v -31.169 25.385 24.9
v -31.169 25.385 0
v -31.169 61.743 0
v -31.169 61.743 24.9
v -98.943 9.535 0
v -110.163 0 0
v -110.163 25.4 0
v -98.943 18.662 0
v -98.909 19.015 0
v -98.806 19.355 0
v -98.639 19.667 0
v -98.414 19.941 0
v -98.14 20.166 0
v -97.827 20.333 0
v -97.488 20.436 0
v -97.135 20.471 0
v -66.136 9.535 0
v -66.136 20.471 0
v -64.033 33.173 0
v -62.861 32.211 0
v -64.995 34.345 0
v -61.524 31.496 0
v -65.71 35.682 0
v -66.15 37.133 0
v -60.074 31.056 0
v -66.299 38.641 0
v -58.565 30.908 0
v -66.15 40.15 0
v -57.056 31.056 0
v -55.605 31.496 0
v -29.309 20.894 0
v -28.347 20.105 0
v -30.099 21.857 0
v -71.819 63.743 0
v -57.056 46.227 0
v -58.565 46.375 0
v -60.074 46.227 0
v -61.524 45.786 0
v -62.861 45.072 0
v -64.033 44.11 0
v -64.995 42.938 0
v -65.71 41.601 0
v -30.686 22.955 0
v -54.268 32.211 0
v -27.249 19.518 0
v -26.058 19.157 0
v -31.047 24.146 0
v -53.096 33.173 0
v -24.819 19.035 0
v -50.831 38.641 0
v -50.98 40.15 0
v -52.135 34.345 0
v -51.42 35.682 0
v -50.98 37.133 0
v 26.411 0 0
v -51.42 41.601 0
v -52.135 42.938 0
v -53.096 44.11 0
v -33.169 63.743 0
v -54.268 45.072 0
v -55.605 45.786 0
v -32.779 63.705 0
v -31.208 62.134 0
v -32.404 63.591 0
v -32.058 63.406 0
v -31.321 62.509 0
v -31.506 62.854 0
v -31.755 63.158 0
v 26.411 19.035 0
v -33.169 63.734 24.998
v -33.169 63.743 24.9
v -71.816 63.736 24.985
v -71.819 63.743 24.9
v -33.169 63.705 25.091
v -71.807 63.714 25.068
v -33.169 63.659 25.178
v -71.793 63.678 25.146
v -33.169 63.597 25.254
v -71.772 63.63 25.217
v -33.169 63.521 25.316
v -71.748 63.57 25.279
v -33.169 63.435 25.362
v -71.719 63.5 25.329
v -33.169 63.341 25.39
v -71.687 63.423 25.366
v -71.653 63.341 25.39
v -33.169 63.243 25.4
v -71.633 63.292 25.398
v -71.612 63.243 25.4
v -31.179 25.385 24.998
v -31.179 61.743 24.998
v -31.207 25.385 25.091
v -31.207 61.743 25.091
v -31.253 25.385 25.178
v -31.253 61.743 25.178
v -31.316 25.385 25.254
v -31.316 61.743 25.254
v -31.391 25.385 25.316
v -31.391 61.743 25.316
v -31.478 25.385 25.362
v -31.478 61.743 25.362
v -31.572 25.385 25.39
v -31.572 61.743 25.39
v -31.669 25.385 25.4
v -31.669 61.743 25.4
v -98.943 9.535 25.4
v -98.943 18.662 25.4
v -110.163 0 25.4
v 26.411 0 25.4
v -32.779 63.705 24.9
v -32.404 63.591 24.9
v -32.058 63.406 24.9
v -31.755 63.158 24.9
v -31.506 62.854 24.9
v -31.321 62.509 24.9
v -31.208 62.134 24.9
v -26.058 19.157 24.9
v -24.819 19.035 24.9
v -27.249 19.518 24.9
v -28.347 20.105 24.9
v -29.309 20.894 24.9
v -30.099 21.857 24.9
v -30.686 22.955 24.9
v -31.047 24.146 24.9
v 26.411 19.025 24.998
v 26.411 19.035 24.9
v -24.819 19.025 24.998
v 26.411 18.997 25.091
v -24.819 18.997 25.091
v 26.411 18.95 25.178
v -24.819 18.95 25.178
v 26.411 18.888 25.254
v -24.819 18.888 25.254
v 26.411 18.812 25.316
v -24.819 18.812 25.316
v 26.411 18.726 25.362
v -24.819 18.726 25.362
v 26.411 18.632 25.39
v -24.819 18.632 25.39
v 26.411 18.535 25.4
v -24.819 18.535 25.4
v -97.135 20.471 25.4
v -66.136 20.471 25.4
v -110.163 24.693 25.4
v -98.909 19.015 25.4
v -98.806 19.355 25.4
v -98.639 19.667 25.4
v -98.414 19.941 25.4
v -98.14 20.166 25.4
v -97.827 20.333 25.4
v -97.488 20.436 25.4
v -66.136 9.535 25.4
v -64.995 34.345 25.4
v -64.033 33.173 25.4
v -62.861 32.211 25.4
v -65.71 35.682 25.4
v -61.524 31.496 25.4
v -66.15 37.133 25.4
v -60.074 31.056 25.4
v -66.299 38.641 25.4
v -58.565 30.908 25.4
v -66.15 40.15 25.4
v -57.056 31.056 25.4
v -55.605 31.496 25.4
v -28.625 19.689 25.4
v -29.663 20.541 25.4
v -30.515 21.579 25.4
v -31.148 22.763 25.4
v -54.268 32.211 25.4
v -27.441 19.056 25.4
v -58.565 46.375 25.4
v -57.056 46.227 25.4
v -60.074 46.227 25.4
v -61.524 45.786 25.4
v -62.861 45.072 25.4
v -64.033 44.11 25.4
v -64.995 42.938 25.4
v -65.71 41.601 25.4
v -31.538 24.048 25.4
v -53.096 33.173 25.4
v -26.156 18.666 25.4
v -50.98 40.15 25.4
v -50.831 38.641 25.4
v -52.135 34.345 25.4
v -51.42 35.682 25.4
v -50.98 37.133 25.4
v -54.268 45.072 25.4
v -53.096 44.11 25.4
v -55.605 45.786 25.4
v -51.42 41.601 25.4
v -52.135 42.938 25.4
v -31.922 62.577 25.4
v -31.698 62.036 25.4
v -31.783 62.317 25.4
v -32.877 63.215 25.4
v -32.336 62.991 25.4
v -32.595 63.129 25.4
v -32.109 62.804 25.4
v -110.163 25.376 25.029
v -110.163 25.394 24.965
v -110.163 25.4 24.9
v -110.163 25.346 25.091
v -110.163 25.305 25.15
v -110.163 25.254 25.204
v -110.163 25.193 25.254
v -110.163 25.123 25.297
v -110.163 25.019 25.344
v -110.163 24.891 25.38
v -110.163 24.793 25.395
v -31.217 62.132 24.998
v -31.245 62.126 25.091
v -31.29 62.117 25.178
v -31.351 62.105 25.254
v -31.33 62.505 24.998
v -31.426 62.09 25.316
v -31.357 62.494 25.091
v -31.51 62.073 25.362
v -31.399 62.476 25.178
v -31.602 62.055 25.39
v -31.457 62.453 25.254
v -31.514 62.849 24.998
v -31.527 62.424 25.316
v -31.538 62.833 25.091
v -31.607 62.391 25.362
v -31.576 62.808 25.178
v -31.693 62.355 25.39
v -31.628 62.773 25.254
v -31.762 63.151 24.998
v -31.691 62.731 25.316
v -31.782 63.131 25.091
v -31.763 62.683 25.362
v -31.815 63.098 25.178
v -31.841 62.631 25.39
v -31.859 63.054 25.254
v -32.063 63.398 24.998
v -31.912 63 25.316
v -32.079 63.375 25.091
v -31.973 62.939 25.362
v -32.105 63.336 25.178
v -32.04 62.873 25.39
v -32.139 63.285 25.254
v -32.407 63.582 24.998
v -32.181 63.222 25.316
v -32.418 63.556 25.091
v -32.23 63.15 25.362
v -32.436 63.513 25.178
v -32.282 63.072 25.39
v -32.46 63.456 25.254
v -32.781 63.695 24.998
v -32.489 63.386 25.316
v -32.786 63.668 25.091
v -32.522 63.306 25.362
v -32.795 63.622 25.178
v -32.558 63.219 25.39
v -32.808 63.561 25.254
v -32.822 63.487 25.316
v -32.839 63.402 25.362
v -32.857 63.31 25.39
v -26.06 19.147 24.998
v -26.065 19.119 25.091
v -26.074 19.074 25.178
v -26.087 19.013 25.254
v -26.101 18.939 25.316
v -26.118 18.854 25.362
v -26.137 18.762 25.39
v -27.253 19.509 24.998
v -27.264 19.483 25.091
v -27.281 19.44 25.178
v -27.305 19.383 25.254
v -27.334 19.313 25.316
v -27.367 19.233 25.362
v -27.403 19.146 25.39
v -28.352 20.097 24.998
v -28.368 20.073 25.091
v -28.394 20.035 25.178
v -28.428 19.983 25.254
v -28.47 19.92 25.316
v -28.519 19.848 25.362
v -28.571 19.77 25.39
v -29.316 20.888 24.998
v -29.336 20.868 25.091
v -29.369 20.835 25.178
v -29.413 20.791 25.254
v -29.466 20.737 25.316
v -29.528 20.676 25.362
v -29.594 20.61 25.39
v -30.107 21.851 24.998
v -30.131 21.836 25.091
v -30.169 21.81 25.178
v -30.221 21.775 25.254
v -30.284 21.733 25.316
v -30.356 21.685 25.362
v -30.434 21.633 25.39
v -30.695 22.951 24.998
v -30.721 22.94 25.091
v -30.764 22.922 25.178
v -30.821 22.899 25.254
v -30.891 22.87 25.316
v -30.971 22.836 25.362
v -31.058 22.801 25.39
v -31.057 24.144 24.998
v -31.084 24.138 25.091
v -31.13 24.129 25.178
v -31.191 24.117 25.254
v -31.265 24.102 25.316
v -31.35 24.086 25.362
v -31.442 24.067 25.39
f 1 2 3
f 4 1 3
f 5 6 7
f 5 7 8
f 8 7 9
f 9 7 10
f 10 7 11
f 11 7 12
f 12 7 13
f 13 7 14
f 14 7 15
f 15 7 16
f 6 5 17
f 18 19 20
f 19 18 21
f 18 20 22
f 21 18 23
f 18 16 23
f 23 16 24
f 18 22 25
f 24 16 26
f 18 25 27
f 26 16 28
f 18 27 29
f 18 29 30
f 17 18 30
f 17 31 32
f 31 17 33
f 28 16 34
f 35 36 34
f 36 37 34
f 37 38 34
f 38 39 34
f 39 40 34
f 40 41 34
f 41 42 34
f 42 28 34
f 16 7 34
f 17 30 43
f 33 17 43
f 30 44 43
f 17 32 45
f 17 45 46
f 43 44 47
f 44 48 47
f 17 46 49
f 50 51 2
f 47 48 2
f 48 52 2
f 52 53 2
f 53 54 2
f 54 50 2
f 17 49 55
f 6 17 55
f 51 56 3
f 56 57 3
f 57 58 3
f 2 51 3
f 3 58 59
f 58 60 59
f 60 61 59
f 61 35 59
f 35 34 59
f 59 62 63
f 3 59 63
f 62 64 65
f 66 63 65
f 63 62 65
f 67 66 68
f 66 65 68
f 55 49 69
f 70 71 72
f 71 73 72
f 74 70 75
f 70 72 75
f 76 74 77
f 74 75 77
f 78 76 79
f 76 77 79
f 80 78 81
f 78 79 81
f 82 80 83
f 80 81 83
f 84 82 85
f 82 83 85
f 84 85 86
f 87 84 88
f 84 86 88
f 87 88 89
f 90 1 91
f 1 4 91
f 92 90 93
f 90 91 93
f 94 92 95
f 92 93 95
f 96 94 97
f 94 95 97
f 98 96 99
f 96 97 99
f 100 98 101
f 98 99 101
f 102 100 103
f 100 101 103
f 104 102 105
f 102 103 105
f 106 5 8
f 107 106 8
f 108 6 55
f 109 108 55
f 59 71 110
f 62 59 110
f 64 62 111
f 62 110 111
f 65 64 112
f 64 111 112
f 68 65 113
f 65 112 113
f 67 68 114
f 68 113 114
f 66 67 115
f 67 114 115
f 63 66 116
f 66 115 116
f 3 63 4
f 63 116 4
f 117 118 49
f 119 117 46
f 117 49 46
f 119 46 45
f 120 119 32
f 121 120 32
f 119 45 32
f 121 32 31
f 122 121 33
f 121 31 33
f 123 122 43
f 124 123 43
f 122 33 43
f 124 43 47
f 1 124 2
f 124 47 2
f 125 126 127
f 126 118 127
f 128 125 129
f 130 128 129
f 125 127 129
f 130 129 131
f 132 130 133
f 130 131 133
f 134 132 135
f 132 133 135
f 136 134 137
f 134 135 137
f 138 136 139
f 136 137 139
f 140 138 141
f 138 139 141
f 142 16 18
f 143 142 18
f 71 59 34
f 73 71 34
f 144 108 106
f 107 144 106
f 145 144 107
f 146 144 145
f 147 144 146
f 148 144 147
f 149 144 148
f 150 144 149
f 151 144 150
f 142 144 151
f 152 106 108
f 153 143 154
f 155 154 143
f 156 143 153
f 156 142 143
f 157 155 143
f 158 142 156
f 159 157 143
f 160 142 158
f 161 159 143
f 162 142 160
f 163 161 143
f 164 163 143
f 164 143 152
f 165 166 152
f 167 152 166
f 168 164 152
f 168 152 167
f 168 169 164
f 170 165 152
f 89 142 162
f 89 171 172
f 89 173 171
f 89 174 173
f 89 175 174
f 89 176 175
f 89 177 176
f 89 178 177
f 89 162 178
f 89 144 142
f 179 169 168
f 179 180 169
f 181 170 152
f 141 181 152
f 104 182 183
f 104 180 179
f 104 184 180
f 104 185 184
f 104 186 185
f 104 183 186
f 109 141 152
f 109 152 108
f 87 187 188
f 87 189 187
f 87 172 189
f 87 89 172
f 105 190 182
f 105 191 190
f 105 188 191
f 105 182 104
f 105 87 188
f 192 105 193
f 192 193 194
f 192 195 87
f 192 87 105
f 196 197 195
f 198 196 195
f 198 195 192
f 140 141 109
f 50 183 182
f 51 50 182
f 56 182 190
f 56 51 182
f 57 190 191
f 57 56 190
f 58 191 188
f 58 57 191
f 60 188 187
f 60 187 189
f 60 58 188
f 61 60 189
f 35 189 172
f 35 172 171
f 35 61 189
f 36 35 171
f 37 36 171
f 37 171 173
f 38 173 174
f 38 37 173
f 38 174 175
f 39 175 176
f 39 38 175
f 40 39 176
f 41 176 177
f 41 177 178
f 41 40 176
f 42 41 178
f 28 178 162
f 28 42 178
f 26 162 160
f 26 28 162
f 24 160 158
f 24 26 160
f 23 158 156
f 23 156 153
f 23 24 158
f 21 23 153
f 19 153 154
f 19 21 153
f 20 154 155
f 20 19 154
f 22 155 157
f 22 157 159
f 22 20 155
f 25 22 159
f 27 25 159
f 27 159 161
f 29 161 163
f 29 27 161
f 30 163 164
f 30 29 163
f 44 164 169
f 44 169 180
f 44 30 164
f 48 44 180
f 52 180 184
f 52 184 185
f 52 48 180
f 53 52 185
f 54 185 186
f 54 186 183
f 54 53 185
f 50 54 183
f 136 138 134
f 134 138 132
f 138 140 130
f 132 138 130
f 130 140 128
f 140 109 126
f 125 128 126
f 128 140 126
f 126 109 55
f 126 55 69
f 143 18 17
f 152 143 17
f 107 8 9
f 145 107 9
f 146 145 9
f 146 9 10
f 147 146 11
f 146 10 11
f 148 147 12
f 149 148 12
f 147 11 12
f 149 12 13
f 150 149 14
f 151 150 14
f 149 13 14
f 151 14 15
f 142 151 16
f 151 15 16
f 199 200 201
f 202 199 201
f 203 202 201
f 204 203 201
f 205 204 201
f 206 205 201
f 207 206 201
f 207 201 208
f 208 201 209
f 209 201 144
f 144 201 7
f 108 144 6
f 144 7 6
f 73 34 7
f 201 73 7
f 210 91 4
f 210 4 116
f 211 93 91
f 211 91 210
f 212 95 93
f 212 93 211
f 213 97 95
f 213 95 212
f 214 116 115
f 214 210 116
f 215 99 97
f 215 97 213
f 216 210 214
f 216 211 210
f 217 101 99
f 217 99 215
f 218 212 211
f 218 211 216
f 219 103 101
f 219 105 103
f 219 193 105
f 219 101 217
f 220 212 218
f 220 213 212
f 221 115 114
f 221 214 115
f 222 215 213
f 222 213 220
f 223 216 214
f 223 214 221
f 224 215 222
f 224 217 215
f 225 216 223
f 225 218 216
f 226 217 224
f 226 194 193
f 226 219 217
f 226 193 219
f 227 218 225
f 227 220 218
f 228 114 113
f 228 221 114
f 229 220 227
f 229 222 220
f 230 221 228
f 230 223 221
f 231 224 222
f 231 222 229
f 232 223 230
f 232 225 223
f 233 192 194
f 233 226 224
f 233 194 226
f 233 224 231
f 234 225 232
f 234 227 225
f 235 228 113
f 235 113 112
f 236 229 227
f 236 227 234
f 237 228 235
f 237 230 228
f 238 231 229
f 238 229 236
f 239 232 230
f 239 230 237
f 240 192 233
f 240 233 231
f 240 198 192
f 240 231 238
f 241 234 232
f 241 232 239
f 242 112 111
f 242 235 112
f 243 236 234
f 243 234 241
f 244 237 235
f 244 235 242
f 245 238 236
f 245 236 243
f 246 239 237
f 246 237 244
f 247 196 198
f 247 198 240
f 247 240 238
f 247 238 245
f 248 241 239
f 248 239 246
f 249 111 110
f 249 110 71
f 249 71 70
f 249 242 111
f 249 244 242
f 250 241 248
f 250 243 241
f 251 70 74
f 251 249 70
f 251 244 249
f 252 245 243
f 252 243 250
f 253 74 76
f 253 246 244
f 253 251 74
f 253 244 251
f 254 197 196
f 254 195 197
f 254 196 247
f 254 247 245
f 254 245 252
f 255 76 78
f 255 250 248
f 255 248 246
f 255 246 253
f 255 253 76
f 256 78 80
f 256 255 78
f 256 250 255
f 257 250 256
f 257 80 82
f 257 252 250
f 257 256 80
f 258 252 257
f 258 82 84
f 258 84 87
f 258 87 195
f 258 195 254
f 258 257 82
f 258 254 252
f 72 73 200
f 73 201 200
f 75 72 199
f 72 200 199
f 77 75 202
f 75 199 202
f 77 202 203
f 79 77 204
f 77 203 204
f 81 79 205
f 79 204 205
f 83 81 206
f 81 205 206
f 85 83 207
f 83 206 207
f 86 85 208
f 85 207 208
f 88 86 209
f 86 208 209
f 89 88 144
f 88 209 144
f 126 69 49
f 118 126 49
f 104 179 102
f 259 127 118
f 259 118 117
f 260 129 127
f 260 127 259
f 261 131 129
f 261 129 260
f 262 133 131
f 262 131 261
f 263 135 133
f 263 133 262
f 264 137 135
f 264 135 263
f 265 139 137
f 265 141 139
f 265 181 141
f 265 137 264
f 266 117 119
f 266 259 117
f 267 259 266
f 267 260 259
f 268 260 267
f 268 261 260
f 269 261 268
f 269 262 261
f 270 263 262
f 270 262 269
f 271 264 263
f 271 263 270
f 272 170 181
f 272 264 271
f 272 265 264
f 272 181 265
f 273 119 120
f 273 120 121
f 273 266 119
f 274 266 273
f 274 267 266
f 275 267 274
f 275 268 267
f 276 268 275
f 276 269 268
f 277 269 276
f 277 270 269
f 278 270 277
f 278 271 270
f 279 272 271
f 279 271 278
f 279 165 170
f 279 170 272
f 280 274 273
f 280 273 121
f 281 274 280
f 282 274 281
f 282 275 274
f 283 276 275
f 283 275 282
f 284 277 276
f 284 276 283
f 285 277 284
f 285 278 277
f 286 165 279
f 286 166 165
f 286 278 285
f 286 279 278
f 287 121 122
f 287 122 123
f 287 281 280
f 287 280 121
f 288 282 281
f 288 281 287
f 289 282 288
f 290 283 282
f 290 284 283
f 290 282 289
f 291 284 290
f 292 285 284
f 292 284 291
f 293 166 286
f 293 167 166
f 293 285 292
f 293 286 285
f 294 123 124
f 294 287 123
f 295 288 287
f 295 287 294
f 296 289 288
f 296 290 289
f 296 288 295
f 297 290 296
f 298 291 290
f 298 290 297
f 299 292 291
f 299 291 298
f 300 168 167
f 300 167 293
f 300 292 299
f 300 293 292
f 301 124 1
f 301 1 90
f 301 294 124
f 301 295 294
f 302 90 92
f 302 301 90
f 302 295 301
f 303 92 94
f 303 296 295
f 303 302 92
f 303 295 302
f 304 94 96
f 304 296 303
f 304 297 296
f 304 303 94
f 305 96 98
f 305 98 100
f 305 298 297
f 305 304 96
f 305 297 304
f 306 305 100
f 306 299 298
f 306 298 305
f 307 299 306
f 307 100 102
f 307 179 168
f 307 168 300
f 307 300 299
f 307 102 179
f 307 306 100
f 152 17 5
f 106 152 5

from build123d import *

# Parameters (mm, degrees)
F0_R     = 7.733721
F1_DEPTH = 25.4
F2_R     = 2
F3_R     = 0.5


with BuildPart() as f1:
    # F0 (on Top) → F1 (new body)
    with BuildSketch(Plane.XY):
        with BuildLine():
            Line((-110.162757, 0), (0, 0))
            Line((0, 0), (26.410511, 0))
            Line((26.410511, 0), (26.410511, 19.034607))
            Line((26.410511, 19.034607), (-24.819163, 19.034607))
            ThreePointArc((-24.819163, 19.034607), (-29.309291, 20.894479), (-31.169163, 25.384607))
            Line((-31.169163, 25.384607), (-31.169163, 63.743327))
            Line((-31.169163, 63.743327), (-71.819431, 63.743327))
            Line((-71.819431, 63.743327), (-110.162757, 25.4))
            Line((-110.162757, 25.4), (-110.162757, 0))
        make_face()
        with BuildLine():
            ThreePointArc((-98.943353, 18.6625), (-98.41362, 19.941388), (-97.134733, 20.47112))
            Line((-97.134733, 20.47112), (-66.135831, 20.47112))
            Line((-66.135831, 20.47112), (-66.135831, 9.535279))
            Line((-66.135831, 9.535279), (-98.943353, 9.535279))
            Line((-98.943353, 9.535279), (-98.943353, 18.6625))
        make_face(mode=Mode.SUBTRACT)
        with Locations((-58.564864, 38.641442)):
            Circle(F0_R, mode=Mode.SUBTRACT)
    extrude(amount=F1_DEPTH)

    # F2
    f2_edges = [f1.edges().sort_by_distance(p)[0] for p in [
        (-31.169163, 63.743327, 12.7),
    ]]
    fillet(f2_edges, radius=F2_R)

    # F3
    f3_edges = [f1.edges().sort_by_distance(p)[0] for p in [
        (-90.991094, 44.571663, 25.4),
        (-52.494297, 63.743327, 25.4),
    ]]
    fillet(f3_edges, radius=F3_R)


solid = f1.part
